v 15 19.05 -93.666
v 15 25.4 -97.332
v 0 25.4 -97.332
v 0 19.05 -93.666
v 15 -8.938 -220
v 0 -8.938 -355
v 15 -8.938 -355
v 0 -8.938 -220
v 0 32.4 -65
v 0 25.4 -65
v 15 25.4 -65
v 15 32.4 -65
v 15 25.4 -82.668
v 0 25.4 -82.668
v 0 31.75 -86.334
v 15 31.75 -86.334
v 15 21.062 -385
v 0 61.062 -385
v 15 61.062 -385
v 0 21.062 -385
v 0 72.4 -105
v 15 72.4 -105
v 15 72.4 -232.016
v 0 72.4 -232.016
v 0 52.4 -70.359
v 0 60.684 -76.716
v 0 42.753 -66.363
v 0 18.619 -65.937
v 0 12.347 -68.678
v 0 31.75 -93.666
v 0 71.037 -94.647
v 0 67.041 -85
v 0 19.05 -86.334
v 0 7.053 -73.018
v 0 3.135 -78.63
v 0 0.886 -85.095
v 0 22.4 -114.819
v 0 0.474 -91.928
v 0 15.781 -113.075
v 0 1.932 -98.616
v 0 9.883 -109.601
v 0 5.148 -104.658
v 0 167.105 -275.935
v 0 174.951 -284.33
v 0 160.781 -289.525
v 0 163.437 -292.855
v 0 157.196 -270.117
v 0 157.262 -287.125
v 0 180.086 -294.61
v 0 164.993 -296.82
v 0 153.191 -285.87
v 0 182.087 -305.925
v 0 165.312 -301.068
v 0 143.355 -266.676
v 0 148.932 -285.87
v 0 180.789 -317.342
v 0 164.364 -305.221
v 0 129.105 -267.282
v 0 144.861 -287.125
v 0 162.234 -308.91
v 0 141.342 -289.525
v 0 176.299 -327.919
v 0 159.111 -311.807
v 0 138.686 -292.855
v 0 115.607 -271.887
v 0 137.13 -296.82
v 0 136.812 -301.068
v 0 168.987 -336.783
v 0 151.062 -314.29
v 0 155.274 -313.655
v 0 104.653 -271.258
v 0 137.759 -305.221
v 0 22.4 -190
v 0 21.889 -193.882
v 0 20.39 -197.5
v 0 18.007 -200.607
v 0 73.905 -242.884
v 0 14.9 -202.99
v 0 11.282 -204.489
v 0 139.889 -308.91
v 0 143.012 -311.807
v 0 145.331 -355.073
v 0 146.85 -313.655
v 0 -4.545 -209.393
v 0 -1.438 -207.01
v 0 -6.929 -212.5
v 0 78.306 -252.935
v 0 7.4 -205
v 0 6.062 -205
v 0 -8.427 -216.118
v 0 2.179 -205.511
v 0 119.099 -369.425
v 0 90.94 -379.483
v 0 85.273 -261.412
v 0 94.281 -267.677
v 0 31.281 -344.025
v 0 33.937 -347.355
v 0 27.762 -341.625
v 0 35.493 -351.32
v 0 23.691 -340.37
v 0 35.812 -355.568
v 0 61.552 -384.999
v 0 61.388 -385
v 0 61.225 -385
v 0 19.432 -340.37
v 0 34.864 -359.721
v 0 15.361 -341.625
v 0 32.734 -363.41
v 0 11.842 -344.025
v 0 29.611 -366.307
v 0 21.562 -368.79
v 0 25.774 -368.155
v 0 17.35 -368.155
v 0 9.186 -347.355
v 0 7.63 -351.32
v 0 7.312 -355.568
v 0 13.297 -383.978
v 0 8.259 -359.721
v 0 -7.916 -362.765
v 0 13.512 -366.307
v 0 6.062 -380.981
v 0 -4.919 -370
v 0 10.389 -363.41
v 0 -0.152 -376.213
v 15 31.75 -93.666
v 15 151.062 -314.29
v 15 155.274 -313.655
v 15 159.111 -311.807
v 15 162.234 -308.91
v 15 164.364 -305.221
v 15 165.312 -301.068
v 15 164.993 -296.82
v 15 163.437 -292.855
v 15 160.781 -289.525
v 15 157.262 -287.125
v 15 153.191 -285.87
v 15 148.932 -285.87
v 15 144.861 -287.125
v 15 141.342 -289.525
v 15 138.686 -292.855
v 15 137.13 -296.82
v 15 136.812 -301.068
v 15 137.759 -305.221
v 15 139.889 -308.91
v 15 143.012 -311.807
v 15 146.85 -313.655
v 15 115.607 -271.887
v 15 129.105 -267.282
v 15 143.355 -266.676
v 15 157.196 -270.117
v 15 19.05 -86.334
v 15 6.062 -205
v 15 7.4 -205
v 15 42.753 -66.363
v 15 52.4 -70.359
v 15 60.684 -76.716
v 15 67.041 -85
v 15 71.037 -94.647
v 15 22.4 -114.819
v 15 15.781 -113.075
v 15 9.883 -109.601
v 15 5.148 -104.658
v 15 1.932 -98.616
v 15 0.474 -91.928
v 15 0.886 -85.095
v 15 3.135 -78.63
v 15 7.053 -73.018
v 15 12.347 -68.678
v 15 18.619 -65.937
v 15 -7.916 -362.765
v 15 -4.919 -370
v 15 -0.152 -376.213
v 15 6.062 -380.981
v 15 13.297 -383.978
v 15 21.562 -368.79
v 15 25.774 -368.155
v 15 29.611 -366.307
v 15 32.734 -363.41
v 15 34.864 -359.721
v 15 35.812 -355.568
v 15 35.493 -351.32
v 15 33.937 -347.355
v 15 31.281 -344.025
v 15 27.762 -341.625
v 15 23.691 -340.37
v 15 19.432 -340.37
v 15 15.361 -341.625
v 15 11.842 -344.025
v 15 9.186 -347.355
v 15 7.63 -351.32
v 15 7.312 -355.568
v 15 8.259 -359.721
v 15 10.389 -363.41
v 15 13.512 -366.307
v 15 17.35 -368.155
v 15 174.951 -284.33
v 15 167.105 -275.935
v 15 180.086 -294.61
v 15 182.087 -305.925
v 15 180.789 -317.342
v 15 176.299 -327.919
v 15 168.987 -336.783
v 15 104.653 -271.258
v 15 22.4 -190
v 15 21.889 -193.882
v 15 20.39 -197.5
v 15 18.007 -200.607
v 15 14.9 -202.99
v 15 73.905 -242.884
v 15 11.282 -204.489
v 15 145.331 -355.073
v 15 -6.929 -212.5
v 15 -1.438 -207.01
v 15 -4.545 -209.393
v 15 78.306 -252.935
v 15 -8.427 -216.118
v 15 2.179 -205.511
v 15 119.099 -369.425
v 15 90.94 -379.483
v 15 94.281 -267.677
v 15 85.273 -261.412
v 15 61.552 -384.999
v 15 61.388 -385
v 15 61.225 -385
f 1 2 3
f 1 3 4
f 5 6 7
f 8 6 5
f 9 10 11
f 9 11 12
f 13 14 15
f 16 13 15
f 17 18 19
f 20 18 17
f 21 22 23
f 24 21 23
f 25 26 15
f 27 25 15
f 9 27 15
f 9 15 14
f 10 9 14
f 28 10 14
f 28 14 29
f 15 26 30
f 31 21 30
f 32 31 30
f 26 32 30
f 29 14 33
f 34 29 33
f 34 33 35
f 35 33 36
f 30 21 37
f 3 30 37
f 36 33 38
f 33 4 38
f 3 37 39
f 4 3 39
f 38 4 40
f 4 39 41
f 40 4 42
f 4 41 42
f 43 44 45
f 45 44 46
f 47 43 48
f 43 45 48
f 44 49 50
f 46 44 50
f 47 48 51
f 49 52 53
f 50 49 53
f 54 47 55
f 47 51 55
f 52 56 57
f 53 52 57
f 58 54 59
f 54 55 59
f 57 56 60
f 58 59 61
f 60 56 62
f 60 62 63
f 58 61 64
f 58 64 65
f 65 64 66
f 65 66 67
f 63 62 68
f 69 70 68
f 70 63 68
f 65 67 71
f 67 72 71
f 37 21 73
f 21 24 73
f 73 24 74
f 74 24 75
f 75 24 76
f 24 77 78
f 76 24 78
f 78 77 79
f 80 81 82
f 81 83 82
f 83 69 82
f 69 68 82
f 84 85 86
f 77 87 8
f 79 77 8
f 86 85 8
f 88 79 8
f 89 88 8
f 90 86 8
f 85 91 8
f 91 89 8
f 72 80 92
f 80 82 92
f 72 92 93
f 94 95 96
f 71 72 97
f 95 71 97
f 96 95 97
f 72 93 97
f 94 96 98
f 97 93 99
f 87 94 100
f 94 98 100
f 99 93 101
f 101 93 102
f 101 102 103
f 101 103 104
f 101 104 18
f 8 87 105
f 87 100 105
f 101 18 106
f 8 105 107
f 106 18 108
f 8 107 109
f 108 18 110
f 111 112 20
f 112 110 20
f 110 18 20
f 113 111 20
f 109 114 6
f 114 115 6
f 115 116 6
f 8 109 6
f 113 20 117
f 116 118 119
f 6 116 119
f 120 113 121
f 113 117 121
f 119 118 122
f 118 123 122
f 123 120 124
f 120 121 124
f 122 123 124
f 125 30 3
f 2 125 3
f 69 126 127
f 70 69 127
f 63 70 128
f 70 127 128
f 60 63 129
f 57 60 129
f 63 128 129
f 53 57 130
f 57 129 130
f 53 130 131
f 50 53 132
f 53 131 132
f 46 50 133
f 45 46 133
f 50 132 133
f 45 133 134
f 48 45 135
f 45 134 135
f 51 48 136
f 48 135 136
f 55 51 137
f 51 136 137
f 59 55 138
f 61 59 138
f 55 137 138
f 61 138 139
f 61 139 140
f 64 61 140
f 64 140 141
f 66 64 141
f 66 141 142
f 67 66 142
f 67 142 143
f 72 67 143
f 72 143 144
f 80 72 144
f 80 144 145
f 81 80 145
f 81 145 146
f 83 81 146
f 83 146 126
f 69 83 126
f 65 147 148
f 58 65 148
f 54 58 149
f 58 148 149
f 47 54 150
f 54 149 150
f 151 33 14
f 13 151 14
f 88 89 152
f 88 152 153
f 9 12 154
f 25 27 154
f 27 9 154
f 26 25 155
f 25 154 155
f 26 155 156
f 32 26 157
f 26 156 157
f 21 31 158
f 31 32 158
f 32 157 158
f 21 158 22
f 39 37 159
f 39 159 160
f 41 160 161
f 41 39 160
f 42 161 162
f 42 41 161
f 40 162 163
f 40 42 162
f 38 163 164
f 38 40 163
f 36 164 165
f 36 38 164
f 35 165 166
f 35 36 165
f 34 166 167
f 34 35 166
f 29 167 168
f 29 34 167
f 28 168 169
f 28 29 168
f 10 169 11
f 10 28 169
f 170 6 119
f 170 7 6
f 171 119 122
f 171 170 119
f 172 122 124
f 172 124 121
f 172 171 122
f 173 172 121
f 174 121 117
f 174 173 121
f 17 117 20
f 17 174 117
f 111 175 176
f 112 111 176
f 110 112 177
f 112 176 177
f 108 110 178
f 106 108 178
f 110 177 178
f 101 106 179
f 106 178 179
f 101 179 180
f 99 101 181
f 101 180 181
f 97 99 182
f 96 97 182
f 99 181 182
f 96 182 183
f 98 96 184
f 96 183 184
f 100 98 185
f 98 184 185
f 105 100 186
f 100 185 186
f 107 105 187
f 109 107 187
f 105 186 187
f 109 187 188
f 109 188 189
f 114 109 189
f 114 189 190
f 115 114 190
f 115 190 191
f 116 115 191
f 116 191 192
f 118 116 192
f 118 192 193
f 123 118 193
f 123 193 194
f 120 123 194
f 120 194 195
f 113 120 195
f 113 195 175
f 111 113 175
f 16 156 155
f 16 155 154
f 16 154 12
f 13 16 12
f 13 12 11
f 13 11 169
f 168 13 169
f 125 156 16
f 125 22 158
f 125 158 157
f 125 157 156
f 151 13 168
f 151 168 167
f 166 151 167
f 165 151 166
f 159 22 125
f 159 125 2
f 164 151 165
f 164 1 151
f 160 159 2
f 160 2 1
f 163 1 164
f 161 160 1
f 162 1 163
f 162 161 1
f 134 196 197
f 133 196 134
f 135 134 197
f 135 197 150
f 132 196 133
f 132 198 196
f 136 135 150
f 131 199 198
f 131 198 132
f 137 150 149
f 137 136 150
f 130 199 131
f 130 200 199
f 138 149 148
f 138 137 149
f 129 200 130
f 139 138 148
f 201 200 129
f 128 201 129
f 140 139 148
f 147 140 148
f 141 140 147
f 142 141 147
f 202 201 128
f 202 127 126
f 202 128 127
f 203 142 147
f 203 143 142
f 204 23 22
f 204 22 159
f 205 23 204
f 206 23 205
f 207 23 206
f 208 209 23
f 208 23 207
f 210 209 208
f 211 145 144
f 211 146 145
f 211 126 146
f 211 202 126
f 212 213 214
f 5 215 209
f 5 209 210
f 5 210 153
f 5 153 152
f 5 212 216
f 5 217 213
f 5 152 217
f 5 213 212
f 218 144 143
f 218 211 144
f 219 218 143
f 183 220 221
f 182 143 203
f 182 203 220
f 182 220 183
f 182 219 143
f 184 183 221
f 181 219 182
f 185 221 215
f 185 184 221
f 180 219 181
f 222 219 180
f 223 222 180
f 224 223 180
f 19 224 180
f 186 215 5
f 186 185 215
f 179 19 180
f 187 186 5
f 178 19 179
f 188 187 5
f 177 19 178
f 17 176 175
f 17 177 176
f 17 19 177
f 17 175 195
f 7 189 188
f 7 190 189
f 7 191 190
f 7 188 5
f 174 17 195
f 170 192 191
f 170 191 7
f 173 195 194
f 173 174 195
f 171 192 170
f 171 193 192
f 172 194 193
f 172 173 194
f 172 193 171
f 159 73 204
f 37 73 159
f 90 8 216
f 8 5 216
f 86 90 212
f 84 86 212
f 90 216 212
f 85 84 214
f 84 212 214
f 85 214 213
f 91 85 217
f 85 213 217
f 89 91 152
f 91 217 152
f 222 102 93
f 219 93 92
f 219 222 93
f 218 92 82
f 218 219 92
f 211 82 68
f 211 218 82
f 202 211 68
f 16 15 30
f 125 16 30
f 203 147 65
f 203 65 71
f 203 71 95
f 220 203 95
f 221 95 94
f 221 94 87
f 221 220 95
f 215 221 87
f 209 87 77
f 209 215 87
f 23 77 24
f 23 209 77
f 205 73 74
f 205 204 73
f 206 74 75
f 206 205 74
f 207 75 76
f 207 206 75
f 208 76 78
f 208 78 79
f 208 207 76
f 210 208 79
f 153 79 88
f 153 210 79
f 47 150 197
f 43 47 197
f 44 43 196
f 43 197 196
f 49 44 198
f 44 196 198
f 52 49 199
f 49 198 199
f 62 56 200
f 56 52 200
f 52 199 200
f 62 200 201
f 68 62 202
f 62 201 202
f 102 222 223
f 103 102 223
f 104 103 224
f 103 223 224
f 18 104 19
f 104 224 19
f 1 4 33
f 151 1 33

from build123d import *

# Parameters (mm, degrees)
SALIENTE_EXTRUIR1_DEPTH = 15
CORTAR_EXTRUIR1_DEPTH   = 477.91260816
REDONDEO1_R             = 220
REDONDEO2_R             = 70
REDONDEO3_R             = 15
REDONDEO4_R             = 30
CROQUIS7_R              = 14.29
CORTAR_EXTRUIR5_DEPTH   = 477.91260816
CROQUIS8_R              = 14.29
CORTAR_EXTRUIR6_DEPTH   = 523
CROQUIS9_R              = 14.289999998
CORTAR_EXTRUIR7_DEPTH   = 10
CROQUIS12_R             = 12.5
CORTAR_EXTRUIR10_DEPTH  = 10
CROQUIS13_R             = 2.02
CORTAR_EXTRUIR11_DEPTH  = 10
CORTAR_EXTRUIR12_DEPTH  = 477.91260816
REDONDEO5_R             = 40
CORTAR_EXTRUIR13_DEPTH  = 429.858749969
REDONDEO6_R             = 40


with BuildPart() as part:
    # Croquis1 → Saliente-Extruir1 (new body)
    with BuildSketch(Plane(origin=(0, 0, 0), x_dir=(0, 0, -1), z_dir=(1, 0, 0))):
        with BuildLine():
            Line((65, 25.4), (65, 281.06162282))
            Line((65, 281.06162282), (385, 281.06162282))
            Line((385, 281.06162282), (385, -8.93837718))
            Line((385, -8.93837718), (205, -8.93837718))
            Line((205, -8.93837718), (205, 22.4))
            Line((205, 22.4), (115, 22.4))
            Line((115, 22.4), (114.819347292, 22.4))
            ThreePointArc((114.819347292, 22.4), (88.497282844, 0.445204045), (65, 25.4))
        make_face()
    extrude(amount=SALIENTE_EXTRUIR1_DEPTH)

    # Croquis2 → Cortar-Extruir1 (cut, through all)
    with BuildSketch(Plane.ZY):
        Polygon((-82.667651581, 25.4), (-86.333825791, 31.75), (-93.666174209, 31.75), (-97.332348419, 25.4), (-93.666174209, 19.05), (-86.333825791, 19.05), align=None)
    extrude(amount=-CORTAR_EXTRUIR1_DEPTH, mode=Mode.SUBTRACT)

    # Redondeo1
    redondeo1_edges = [part.edges().sort_by_distance(p)[0] for p in [
        (7.5, 281.06162282, -385),
    ]]
    fillet(redondeo1_edges, radius=REDONDEO1_R)

    # Redondeo2
    redondeo2_edges = [part.edges().sort_by_distance(p)[0] for p in [
        (7.5, 281.06162282, -65),
    ]]
    fillet(redondeo2_edges, radius=REDONDEO2_R)

    # Redondeo3
    redondeo3_edges = [part.edges().sort_by_distance(p)[0] for p in [
        (7.5, -8.93837718, -205),
        (7.5, 22.4, -205),
    ]]
    fillet(redondeo3_edges, radius=REDONDEO3_R)

    # Redondeo4
    redondeo4_edges = [part.edges().sort_by_distance(p)[0] for p in [
        (7.5, -8.93837718, -385),
    ]]
    fillet(redondeo4_edges, radius=REDONDEO4_R)

    # Croquis7 → Cortar-Extruir5 (cut, through all)
    with BuildSketch(Plane(origin=(15, 0, 0), x_dir=(0, 0, -1), z_dir=(1, 0, 0))):
        with Locations((354.499999998, 21.561622823)):
            Circle(CROQUIS7_R)
    extrude(amount=-CORTAR_EXTRUIR5_DEPTH, mode=Mode.SUBTRACT)

    # Croquis8 → Cortar-Extruir6 (cut)
    with BuildSketch(Plane(origin=(15, 0, 0), x_dir=(0, 0, -1), z_dir=(1, 0, 0))):
        with Locations((299.999999998, 151.061622823)):
            Circle(CROQUIS8_R)
    extrude(amount=-CORTAR_EXTRUIR6_DEPTH, mode=Mode.SUBTRACT)

    # Croquis9 → Cortar-Extruir7 (cut)
    with BuildSketch(Plane(origin=(15, 0, 0), x_dir=(0, 0, -1), z_dir=(1, 0, 0))):
        with Locations((184.499999998, 231.061622823)):
            Circle(CROQUIS9_R)
    extrude(amount=-CORTAR_EXTRUIR7_DEPTH, mode=Mode.SUBTRACT)

    # Croquis12 → Cortar-Extruir10 (cut)
    with BuildSketch(Plane.ZY):
        with Locations((-267.424734061, 207.135375692)):
            Circle(CROQUIS12_R)
    extrude(amount=-CORTAR_EXTRUIR10_DEPTH, mode=Mode.SUBTRACT)

    # Croquis13 → Cortar-Extruir11 (cut)
    with BuildSketch(Plane.ZY):
        with Locations((-263.175315265, 232.177389187)):
            Circle(CROQUIS13_R)
        with Locations((-271.674152858, 182.093362197)):
            Circle(CROQUIS13_R)
    extrude(amount=-CORTAR_EXTRUIR11_DEPTH, mode=Mode.SUBTRACT)

    # Croquis14 → Cortar-Extruir12 (cut, through all)
    with BuildSketch(Plane(origin=(15, 0, 0), x_dir=(0, 0, -1), z_dir=(1, 0, 0))):
        with BuildLine():
            Line((65, 72.4), (270, 72.4))
            ThreePointArc((270, 72.4), (274.363902477, 93.8541681), (271.886825139, 115.607077366))
            ThreePointArc((271.886825139, 115.607077366), (293.695729554, 182.870527235), (360.959179423, 161.06162282))
            Line((360.959179423, 161.06162282), (409.037931036, 257.33581614))
            Line((409.037931036, 257.33581614), (105.335360325, 302.08857435))
            Line((105.335360325, 302.08857435), (0, 212.58305793))
            Line((0, 212.58305793), (65, 72.4))
        make_face()
    extrude(amount=-CORTAR_EXTRUIR12_DEPTH, mode=Mode.SUBTRACT)

    # Redondeo5
    # the kernel refuses this fillet: 40 mm, written as the material it adds along each edge
    with BuildSketch(Plane(origin=(15, 72.4, -270), x_dir=(0, 0.9990478553757552, -0.04362777405625806), z_dir=(-1, 0, 0))) as redondeo5_piece_1:
        with BuildLine():
            CenterArc((38.304739361, -39.69334508), REDONDEO5_R, 82.900783035, 94.598735985)
            Line((-1.657174854, -37.948234118), (0, 0))
            ThreePointArc((0, 0), (21.62412798, 3.423749812), (43.24825596, 0))
        make_face()
    extrude(amount=15)
    # the kernel refuses this fillet: 40 mm, written as the material it takes off along each edge
    with BuildSketch(Plane(origin=(115, 72.4, -65), x_dir=(0, 0, -1), z_dir=(-1, 0, 0))) as redondeo5_2_piece_1:
        with BuildLine():
            CenterArc((REDONDEO5_R, REDONDEO5_R), REDONDEO5_R, 180, 90)
            Line((0, REDONDEO5_R), (0, 0))
            Line((0, 0), (REDONDEO5_R, 0))
        make_face()
    extrude(amount=215, mode=Mode.SUBTRACT)

    # Croquis15 → Cortar-Extruir13 (cut, through all)
    with BuildSketch(Plane(origin=(15, 0, 0), x_dir=(0, 0, -1), z_dir=(1, 0, 0))):
        with BuildLine():
            Line((316.423002092, 188.334350093), (358.626196651, 190.922485321))
            Line((358.626196651, 190.922485321), (422.761195779, 101.204099428))
            Line((422.761195779, 101.204099428), (385, 21.06162282))
            ThreePointArc((385, 21.06162282), (371.881027209, 113.376882144), (316.423002092, 188.334350093))
        make_face()
    extrude(amount=-CORTAR_EXTRUIR13_DEPTH, mode=Mode.SUBTRACT)

    # Redondeo6
    # the kernel refuses this fillet: 40 mm, written as the material it takes off along each edge
    with BuildSketch(Plane(origin=(154.505258907, 188.334350093, -316.423002092), x_dir=(0, -0.5580210387586911, 0.8298268013885014), z_dir=(-1, 0, 0))) as redondeo6_piece_1:
        with BuildLine():
            CenterArc((33.481262138, -33.19307214), REDONDEO6_R, 56.080950645, 115.615192881)
            ThreePointArc((-6.099380681, -27.416159986), (-3.556977801, -13.595221761), (0, 0))
            ThreePointArc((0, 0), (27.901051781, 8.508659825), (55.802103563, 0))
        make_face()
    extrude(amount=294.010517815, mode=Mode.SUBTRACT)


solid = part.part
